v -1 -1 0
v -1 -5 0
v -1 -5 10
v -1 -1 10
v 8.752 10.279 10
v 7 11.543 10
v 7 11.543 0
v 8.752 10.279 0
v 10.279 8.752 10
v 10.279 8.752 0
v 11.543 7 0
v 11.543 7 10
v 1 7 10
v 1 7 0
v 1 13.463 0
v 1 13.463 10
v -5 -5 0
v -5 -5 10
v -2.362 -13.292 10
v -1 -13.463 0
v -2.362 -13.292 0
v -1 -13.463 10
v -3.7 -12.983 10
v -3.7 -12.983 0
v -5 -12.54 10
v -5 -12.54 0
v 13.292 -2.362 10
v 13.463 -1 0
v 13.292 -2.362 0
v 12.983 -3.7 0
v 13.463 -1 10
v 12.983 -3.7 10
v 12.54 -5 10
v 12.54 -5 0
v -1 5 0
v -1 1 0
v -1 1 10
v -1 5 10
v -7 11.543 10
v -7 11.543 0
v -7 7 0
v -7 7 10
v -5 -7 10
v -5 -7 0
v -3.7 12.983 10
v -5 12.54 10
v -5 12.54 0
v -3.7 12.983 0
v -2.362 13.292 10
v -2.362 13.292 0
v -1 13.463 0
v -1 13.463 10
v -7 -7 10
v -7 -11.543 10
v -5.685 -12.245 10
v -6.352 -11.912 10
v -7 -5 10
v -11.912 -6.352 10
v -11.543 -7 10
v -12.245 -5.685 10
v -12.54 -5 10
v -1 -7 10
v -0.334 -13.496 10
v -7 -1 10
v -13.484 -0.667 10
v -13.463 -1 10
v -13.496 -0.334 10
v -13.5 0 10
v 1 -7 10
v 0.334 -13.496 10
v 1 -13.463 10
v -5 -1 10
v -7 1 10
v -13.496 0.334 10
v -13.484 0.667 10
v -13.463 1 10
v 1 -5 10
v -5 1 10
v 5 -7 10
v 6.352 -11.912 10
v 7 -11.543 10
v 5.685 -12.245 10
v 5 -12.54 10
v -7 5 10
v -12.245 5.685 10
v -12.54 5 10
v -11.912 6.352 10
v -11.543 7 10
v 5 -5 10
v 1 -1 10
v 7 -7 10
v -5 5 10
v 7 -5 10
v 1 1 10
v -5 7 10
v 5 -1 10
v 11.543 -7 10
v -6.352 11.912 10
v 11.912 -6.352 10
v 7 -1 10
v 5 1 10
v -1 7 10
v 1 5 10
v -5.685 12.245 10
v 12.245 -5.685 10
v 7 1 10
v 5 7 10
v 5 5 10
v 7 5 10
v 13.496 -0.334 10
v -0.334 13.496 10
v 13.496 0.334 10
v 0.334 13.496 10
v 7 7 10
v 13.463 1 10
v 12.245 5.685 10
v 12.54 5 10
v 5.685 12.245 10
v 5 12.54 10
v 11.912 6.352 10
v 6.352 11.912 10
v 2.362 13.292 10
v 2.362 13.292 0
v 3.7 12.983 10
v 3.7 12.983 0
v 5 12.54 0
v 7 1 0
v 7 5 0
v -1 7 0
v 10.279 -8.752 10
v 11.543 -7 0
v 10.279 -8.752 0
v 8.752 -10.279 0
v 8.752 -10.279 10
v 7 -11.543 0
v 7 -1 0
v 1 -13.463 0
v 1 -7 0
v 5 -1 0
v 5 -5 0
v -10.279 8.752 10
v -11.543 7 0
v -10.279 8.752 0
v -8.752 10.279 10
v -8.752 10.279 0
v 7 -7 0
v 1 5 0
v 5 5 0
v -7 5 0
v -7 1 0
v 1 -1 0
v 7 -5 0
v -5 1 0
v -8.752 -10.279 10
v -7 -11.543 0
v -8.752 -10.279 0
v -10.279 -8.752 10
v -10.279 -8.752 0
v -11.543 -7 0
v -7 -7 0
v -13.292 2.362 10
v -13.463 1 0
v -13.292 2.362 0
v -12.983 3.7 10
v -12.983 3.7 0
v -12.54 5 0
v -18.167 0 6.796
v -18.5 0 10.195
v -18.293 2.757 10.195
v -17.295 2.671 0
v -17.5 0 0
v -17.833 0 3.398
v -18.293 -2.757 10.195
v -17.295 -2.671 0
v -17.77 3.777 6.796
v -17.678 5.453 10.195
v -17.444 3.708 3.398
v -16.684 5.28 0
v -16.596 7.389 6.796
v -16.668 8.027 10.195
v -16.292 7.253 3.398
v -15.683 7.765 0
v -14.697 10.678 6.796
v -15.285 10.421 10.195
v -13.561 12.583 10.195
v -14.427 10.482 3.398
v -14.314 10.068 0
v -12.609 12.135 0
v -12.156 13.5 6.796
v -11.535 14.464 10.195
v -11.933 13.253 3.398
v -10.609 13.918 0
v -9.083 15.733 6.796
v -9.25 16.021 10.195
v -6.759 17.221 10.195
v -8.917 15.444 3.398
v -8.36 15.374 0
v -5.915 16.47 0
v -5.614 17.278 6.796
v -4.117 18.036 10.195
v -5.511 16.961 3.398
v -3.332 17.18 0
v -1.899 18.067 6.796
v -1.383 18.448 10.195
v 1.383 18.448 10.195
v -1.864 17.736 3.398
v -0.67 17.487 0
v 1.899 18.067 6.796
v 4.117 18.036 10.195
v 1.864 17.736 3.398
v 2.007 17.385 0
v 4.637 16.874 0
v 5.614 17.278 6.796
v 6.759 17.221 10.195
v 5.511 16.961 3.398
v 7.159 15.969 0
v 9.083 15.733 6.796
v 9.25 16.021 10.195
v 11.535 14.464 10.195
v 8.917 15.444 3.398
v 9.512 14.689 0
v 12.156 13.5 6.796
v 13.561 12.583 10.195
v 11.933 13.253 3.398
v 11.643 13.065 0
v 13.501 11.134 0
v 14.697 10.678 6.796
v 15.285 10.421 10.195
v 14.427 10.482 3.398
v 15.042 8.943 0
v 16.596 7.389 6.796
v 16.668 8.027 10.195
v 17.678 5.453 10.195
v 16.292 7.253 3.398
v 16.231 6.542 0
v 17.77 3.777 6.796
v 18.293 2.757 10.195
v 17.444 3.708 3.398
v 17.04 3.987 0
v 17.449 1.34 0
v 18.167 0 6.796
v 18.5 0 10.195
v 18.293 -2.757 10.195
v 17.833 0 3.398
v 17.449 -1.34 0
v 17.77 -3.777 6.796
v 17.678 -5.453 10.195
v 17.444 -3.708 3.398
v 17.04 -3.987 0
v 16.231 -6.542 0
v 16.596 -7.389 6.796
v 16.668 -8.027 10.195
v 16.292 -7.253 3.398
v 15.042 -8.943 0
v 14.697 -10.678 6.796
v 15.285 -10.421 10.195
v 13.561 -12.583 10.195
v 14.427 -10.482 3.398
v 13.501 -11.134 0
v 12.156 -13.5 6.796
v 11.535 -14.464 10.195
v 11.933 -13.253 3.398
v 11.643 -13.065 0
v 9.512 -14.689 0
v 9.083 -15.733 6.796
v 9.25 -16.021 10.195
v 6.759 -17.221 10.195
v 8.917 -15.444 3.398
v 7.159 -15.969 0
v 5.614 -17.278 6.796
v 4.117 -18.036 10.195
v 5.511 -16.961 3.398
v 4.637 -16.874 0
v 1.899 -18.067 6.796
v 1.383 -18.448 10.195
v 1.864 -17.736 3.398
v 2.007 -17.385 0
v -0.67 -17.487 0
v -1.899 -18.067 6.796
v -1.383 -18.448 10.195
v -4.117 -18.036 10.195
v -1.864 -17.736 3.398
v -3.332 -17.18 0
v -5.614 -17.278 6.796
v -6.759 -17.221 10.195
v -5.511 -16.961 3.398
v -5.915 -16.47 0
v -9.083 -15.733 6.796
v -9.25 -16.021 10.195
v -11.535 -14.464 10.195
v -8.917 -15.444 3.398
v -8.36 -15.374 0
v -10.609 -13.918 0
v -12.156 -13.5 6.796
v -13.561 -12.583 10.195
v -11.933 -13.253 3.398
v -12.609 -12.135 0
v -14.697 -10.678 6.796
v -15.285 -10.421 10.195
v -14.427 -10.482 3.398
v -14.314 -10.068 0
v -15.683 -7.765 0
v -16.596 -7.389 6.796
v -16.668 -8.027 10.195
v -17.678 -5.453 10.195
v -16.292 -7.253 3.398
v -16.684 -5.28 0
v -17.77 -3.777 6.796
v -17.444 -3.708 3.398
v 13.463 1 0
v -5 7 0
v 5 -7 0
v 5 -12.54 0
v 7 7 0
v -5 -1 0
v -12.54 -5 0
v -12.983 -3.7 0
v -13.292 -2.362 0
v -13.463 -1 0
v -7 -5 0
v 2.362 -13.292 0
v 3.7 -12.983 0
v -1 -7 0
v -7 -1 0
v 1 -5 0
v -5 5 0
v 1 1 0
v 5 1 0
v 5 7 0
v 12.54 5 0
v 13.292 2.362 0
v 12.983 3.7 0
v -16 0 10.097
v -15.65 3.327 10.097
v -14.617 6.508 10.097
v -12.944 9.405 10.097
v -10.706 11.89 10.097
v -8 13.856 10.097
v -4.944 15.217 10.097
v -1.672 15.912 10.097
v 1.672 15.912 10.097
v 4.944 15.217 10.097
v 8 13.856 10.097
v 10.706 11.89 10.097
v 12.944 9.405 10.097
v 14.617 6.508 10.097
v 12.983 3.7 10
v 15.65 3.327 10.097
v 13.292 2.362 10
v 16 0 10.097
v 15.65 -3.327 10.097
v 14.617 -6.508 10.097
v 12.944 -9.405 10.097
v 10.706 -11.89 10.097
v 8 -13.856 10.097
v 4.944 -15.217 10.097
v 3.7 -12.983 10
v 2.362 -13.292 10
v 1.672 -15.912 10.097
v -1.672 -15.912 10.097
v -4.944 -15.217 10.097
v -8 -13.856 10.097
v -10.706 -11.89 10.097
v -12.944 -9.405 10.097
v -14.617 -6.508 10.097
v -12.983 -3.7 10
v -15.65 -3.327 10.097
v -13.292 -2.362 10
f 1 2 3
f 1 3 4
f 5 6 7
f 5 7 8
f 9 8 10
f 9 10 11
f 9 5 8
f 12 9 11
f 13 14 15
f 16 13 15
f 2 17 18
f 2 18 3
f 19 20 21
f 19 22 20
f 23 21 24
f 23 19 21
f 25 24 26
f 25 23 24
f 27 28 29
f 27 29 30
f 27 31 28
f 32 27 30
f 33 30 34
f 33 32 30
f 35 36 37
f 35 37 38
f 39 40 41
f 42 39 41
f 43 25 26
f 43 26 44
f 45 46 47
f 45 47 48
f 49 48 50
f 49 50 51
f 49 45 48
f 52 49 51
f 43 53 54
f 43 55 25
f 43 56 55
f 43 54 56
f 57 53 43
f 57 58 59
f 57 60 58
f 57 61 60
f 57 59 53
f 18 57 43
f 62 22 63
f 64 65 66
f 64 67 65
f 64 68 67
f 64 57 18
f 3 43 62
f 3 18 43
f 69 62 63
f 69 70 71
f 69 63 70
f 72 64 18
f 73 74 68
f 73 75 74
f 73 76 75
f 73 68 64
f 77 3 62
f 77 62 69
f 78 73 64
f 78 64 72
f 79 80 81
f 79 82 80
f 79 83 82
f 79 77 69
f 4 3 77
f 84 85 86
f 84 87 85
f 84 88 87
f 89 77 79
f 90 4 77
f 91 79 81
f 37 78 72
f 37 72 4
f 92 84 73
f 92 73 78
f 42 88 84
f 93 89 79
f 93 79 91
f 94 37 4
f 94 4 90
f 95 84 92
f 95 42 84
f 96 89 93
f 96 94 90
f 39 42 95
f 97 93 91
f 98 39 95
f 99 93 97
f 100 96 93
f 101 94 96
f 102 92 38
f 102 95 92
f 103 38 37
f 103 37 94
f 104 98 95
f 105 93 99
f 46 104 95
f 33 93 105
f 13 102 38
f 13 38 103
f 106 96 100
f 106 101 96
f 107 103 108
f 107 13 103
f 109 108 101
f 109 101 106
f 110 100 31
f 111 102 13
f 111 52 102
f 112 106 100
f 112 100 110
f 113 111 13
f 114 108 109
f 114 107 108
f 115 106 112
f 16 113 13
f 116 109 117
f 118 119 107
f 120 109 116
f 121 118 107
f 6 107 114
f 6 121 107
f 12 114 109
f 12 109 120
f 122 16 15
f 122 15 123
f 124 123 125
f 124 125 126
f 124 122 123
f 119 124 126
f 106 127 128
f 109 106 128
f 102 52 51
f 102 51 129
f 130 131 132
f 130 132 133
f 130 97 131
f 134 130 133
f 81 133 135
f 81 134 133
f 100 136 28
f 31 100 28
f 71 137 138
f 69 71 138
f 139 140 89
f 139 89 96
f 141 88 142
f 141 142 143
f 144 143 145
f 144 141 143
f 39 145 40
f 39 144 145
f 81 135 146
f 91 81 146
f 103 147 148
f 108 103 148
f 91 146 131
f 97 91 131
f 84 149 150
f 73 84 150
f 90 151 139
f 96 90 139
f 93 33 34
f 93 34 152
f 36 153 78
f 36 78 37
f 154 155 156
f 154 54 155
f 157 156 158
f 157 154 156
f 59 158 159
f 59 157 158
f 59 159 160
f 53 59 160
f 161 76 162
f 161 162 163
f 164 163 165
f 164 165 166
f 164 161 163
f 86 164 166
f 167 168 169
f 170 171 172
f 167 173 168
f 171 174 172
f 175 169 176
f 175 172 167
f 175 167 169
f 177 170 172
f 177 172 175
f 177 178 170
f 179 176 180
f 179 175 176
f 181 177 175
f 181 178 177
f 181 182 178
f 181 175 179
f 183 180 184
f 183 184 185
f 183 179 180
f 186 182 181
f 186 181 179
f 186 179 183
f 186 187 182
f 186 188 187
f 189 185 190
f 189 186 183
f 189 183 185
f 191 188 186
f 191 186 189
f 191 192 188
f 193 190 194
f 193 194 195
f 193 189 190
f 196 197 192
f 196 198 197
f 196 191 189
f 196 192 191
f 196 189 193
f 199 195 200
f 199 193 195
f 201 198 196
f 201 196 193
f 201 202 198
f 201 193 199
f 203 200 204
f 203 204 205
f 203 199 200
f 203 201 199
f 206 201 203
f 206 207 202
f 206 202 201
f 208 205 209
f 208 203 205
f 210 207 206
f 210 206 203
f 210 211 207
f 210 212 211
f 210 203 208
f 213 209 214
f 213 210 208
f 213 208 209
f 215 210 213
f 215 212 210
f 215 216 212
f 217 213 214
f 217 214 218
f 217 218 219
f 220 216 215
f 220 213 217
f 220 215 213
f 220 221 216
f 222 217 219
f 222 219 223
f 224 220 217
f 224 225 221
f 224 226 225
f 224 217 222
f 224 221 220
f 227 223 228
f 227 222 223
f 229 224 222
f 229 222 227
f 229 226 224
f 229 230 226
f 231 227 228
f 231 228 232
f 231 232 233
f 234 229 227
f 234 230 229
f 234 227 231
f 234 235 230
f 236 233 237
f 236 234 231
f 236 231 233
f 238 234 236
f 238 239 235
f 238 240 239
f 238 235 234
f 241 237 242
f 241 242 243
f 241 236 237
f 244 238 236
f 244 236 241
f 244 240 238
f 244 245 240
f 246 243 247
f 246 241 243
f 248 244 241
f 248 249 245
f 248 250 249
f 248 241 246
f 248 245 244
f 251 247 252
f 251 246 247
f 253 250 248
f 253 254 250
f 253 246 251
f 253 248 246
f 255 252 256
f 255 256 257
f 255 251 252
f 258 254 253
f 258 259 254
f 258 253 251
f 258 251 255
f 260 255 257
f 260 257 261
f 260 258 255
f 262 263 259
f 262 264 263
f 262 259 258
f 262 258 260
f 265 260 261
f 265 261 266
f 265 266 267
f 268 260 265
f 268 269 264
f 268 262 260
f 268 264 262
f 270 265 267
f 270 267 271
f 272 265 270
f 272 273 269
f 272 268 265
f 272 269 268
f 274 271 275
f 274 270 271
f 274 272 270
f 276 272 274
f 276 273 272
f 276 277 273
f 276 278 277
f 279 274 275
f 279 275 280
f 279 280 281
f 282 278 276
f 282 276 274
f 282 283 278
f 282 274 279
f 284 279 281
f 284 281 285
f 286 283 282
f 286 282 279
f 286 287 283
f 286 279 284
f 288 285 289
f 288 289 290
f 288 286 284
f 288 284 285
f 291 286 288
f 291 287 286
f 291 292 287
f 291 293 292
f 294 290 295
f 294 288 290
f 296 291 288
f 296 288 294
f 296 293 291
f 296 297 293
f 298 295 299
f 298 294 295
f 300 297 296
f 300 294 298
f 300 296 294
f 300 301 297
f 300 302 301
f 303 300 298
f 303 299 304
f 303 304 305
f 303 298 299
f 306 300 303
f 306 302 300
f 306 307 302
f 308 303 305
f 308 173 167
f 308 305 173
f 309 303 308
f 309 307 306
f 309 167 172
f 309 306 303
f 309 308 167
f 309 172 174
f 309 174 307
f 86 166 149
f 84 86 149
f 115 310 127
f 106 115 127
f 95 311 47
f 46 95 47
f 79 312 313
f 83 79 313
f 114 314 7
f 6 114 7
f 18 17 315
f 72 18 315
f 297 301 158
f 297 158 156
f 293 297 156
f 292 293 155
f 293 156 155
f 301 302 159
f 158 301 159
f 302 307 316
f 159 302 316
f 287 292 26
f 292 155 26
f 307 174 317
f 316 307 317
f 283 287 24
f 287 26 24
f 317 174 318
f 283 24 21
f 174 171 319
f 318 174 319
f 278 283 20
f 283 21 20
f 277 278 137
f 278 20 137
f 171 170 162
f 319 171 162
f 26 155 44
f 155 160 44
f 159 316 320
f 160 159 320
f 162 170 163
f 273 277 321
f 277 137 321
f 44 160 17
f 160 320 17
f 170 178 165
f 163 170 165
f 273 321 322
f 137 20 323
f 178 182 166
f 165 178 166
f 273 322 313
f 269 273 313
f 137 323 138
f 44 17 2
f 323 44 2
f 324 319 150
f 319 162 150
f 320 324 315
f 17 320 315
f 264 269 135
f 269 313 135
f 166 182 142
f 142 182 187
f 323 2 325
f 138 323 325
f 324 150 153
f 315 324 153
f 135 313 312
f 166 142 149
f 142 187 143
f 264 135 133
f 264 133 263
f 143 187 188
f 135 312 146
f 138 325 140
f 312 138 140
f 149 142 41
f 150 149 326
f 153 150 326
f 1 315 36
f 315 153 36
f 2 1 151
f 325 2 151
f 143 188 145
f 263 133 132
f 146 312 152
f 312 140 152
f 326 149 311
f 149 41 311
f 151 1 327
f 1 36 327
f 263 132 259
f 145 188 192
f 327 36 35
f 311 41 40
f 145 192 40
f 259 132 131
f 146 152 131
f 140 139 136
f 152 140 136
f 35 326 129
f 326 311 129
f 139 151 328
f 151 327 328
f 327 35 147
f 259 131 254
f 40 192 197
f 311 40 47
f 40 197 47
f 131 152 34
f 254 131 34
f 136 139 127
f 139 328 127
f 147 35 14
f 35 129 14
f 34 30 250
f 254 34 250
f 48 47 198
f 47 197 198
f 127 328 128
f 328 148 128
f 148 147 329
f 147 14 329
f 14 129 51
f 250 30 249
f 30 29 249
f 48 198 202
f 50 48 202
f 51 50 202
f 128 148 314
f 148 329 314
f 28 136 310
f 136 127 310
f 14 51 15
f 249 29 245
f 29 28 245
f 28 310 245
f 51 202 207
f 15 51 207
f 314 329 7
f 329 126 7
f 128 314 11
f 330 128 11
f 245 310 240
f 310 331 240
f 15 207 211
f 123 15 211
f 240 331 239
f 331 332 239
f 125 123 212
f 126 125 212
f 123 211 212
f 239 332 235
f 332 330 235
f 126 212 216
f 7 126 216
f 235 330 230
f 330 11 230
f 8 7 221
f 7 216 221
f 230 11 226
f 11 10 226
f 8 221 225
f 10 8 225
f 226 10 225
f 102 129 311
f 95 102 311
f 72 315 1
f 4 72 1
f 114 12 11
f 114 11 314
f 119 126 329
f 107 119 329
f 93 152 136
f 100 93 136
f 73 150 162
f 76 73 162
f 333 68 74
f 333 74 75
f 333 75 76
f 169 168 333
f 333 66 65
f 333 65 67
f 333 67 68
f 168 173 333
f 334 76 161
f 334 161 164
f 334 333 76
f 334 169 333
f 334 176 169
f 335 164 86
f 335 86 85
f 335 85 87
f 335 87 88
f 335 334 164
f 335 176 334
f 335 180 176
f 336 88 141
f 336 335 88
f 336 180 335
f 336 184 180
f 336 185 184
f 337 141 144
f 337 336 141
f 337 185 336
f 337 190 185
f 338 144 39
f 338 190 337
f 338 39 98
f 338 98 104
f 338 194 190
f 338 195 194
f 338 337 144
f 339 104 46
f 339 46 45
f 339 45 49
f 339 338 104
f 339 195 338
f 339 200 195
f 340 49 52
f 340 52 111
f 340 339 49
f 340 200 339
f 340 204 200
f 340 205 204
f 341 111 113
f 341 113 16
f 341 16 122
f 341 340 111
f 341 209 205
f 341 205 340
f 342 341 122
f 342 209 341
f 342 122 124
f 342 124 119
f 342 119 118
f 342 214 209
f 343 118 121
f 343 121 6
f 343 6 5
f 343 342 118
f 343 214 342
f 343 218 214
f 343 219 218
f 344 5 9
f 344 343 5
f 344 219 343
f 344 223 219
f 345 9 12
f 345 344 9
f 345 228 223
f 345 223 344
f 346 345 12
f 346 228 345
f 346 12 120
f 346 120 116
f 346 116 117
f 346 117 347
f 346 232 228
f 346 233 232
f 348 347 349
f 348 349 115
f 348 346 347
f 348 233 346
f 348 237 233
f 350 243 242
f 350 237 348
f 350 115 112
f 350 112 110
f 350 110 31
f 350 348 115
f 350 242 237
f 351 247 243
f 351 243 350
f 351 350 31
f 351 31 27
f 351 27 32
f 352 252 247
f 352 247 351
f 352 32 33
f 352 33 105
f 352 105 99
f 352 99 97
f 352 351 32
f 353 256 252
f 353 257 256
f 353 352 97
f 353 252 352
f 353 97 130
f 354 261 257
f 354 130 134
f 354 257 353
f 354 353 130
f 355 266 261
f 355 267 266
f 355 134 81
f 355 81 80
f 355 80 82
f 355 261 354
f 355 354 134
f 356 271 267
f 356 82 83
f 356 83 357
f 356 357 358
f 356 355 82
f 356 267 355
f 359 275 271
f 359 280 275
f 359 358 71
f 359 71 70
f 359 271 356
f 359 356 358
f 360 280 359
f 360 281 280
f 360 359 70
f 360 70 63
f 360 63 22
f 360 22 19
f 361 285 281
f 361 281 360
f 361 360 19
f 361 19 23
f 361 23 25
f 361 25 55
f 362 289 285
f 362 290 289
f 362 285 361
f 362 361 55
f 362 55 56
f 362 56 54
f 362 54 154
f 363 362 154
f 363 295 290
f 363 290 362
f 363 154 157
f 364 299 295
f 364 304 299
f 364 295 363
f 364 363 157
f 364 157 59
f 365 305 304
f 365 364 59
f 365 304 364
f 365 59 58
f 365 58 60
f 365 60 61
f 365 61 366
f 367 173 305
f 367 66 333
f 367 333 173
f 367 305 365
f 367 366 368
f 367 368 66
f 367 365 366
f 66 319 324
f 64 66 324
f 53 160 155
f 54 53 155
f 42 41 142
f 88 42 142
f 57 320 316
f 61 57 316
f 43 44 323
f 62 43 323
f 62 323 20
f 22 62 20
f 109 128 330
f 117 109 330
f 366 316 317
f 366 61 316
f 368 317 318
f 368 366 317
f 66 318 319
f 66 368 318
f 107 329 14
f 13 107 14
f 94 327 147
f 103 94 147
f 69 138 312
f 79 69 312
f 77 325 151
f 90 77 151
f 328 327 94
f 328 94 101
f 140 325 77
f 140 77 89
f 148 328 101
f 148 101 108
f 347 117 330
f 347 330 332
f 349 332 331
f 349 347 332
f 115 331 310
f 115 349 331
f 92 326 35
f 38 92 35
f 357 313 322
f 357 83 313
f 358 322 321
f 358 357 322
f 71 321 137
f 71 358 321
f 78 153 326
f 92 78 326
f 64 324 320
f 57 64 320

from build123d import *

# Parameters (mm, degrees)
F2_W     = 4
F2_H     = 4
F3_DEPTH = 10


with BuildPart() as f1:
    # F0 (on Front) → F1 (revolve)
    with BuildSketch(Plane.XZ):
        Polygon((-18.5, 10.194688), (-17.5, 0), (-13.5, 0), (-13.5, 10), align=None)
    revolve(axis=Axis((0, 0, 3.021993), (0, 0, -1)))

    # F2 (on Top) → F3 (join)
    with BuildSketch(Plane.XY):
        with BuildLine():
            Line((-7, 7), (-11.666143, 7))
            ThreePointArc((-11.666143, 7), (-12.200632, 6.020256), (-12.653019, 5))
            Line((-12.653019, 5), (-7, 5))
            Line((-7, 5), (-7, 1))
            Line((-7, 1), (-13.568305, 1))
            ThreePointArc((-13.568305, 1), (-13.605106, 0), (-13.568305, -1))
            Line((-13.568305, -1), (-7, -1))
            Line((-7, -1), (-7, -5))
            Line((-7, -5), (-12.653019, -5))
            ThreePointArc((-12.653019, -5), (-12.200632, -6.020256), (-11.666143, -7))
            Line((-11.666143, -7), (-7, -7))
            Line((-7, -7), (-7, -11.666143))
            ThreePointArc((-7, -11.666143), (-6.020256, -12.200632), (-5, -12.653019))
            Line((-5, -12.653019), (-5, -7))
            Line((-5, -7), (-1, -7))
            Line((-1, -7), (-1, -13.568305))
            ThreePointArc((-1, -13.568305), (0, -13.605106), (1, -13.568305))
            Line((1, -13.568305), (1, -7))
            Line((1, -7), (5, -7))
            Line((5, -7), (5, -12.653019))
            ThreePointArc((5, -12.653019), (6.020256, -12.200632), (7, -11.666143))
            Line((7, -11.666143), (7, -7))
            Line((7, -7), (11.666143, -7))
            ThreePointArc((11.666143, -7), (12.200632, -6.020256), (12.653019, -5))
            Line((12.653019, -5), (7, -5))
            Line((7, -5), (7, -1))
            Line((7, -1), (13.568305, -1))
            ThreePointArc((13.568305, -1), (13.605106, 0), (13.568305, 1))
            Line((13.568305, 1), (7, 1))
            Line((7, 1), (7, 5))
            Line((7, 5), (12.653019, 5))
            ThreePointArc((12.653019, 5), (12.200632, 6.020256), (11.666143, 7))
            Line((11.666143, 7), (7, 7))
            Line((7, 7), (7, 11.666143))
            ThreePointArc((7, 11.666143), (6.020256, 12.200632), (5, 12.653019))
            Line((5, 12.653019), (5, 7))
            Line((5, 7), (1, 7))
            Line((1, 7), (1, 13.568305))
            ThreePointArc((1, 13.568305), (0, 13.605106), (-1, 13.568305))
            Line((-1, 13.568305), (-1, 7))
            Line((-1, 7), (-5, 7))
            Line((-5, 7), (-5, 12.653019))
            ThreePointArc((-5, 12.653019), (-6.020256, 12.200632), (-7, 11.666143))
            Line((-7, 11.666143), (-7, 7))
        make_face()
        with Locations((-3, -3)):
            Rectangle(F2_W, F2_H, mode=Mode.SUBTRACT)
        with Locations((3, -3)):
            Rectangle(F2_W, F2_H, mode=Mode.SUBTRACT)
        with Locations((-3, 3)):
            Rectangle(F2_W, F2_H, mode=Mode.SUBTRACT)
        with Locations((3, 3)):
            Rectangle(F2_W, F2_H, mode=Mode.SUBTRACT)
    extrude(amount=F3_DEPTH)


solid = f1.part
